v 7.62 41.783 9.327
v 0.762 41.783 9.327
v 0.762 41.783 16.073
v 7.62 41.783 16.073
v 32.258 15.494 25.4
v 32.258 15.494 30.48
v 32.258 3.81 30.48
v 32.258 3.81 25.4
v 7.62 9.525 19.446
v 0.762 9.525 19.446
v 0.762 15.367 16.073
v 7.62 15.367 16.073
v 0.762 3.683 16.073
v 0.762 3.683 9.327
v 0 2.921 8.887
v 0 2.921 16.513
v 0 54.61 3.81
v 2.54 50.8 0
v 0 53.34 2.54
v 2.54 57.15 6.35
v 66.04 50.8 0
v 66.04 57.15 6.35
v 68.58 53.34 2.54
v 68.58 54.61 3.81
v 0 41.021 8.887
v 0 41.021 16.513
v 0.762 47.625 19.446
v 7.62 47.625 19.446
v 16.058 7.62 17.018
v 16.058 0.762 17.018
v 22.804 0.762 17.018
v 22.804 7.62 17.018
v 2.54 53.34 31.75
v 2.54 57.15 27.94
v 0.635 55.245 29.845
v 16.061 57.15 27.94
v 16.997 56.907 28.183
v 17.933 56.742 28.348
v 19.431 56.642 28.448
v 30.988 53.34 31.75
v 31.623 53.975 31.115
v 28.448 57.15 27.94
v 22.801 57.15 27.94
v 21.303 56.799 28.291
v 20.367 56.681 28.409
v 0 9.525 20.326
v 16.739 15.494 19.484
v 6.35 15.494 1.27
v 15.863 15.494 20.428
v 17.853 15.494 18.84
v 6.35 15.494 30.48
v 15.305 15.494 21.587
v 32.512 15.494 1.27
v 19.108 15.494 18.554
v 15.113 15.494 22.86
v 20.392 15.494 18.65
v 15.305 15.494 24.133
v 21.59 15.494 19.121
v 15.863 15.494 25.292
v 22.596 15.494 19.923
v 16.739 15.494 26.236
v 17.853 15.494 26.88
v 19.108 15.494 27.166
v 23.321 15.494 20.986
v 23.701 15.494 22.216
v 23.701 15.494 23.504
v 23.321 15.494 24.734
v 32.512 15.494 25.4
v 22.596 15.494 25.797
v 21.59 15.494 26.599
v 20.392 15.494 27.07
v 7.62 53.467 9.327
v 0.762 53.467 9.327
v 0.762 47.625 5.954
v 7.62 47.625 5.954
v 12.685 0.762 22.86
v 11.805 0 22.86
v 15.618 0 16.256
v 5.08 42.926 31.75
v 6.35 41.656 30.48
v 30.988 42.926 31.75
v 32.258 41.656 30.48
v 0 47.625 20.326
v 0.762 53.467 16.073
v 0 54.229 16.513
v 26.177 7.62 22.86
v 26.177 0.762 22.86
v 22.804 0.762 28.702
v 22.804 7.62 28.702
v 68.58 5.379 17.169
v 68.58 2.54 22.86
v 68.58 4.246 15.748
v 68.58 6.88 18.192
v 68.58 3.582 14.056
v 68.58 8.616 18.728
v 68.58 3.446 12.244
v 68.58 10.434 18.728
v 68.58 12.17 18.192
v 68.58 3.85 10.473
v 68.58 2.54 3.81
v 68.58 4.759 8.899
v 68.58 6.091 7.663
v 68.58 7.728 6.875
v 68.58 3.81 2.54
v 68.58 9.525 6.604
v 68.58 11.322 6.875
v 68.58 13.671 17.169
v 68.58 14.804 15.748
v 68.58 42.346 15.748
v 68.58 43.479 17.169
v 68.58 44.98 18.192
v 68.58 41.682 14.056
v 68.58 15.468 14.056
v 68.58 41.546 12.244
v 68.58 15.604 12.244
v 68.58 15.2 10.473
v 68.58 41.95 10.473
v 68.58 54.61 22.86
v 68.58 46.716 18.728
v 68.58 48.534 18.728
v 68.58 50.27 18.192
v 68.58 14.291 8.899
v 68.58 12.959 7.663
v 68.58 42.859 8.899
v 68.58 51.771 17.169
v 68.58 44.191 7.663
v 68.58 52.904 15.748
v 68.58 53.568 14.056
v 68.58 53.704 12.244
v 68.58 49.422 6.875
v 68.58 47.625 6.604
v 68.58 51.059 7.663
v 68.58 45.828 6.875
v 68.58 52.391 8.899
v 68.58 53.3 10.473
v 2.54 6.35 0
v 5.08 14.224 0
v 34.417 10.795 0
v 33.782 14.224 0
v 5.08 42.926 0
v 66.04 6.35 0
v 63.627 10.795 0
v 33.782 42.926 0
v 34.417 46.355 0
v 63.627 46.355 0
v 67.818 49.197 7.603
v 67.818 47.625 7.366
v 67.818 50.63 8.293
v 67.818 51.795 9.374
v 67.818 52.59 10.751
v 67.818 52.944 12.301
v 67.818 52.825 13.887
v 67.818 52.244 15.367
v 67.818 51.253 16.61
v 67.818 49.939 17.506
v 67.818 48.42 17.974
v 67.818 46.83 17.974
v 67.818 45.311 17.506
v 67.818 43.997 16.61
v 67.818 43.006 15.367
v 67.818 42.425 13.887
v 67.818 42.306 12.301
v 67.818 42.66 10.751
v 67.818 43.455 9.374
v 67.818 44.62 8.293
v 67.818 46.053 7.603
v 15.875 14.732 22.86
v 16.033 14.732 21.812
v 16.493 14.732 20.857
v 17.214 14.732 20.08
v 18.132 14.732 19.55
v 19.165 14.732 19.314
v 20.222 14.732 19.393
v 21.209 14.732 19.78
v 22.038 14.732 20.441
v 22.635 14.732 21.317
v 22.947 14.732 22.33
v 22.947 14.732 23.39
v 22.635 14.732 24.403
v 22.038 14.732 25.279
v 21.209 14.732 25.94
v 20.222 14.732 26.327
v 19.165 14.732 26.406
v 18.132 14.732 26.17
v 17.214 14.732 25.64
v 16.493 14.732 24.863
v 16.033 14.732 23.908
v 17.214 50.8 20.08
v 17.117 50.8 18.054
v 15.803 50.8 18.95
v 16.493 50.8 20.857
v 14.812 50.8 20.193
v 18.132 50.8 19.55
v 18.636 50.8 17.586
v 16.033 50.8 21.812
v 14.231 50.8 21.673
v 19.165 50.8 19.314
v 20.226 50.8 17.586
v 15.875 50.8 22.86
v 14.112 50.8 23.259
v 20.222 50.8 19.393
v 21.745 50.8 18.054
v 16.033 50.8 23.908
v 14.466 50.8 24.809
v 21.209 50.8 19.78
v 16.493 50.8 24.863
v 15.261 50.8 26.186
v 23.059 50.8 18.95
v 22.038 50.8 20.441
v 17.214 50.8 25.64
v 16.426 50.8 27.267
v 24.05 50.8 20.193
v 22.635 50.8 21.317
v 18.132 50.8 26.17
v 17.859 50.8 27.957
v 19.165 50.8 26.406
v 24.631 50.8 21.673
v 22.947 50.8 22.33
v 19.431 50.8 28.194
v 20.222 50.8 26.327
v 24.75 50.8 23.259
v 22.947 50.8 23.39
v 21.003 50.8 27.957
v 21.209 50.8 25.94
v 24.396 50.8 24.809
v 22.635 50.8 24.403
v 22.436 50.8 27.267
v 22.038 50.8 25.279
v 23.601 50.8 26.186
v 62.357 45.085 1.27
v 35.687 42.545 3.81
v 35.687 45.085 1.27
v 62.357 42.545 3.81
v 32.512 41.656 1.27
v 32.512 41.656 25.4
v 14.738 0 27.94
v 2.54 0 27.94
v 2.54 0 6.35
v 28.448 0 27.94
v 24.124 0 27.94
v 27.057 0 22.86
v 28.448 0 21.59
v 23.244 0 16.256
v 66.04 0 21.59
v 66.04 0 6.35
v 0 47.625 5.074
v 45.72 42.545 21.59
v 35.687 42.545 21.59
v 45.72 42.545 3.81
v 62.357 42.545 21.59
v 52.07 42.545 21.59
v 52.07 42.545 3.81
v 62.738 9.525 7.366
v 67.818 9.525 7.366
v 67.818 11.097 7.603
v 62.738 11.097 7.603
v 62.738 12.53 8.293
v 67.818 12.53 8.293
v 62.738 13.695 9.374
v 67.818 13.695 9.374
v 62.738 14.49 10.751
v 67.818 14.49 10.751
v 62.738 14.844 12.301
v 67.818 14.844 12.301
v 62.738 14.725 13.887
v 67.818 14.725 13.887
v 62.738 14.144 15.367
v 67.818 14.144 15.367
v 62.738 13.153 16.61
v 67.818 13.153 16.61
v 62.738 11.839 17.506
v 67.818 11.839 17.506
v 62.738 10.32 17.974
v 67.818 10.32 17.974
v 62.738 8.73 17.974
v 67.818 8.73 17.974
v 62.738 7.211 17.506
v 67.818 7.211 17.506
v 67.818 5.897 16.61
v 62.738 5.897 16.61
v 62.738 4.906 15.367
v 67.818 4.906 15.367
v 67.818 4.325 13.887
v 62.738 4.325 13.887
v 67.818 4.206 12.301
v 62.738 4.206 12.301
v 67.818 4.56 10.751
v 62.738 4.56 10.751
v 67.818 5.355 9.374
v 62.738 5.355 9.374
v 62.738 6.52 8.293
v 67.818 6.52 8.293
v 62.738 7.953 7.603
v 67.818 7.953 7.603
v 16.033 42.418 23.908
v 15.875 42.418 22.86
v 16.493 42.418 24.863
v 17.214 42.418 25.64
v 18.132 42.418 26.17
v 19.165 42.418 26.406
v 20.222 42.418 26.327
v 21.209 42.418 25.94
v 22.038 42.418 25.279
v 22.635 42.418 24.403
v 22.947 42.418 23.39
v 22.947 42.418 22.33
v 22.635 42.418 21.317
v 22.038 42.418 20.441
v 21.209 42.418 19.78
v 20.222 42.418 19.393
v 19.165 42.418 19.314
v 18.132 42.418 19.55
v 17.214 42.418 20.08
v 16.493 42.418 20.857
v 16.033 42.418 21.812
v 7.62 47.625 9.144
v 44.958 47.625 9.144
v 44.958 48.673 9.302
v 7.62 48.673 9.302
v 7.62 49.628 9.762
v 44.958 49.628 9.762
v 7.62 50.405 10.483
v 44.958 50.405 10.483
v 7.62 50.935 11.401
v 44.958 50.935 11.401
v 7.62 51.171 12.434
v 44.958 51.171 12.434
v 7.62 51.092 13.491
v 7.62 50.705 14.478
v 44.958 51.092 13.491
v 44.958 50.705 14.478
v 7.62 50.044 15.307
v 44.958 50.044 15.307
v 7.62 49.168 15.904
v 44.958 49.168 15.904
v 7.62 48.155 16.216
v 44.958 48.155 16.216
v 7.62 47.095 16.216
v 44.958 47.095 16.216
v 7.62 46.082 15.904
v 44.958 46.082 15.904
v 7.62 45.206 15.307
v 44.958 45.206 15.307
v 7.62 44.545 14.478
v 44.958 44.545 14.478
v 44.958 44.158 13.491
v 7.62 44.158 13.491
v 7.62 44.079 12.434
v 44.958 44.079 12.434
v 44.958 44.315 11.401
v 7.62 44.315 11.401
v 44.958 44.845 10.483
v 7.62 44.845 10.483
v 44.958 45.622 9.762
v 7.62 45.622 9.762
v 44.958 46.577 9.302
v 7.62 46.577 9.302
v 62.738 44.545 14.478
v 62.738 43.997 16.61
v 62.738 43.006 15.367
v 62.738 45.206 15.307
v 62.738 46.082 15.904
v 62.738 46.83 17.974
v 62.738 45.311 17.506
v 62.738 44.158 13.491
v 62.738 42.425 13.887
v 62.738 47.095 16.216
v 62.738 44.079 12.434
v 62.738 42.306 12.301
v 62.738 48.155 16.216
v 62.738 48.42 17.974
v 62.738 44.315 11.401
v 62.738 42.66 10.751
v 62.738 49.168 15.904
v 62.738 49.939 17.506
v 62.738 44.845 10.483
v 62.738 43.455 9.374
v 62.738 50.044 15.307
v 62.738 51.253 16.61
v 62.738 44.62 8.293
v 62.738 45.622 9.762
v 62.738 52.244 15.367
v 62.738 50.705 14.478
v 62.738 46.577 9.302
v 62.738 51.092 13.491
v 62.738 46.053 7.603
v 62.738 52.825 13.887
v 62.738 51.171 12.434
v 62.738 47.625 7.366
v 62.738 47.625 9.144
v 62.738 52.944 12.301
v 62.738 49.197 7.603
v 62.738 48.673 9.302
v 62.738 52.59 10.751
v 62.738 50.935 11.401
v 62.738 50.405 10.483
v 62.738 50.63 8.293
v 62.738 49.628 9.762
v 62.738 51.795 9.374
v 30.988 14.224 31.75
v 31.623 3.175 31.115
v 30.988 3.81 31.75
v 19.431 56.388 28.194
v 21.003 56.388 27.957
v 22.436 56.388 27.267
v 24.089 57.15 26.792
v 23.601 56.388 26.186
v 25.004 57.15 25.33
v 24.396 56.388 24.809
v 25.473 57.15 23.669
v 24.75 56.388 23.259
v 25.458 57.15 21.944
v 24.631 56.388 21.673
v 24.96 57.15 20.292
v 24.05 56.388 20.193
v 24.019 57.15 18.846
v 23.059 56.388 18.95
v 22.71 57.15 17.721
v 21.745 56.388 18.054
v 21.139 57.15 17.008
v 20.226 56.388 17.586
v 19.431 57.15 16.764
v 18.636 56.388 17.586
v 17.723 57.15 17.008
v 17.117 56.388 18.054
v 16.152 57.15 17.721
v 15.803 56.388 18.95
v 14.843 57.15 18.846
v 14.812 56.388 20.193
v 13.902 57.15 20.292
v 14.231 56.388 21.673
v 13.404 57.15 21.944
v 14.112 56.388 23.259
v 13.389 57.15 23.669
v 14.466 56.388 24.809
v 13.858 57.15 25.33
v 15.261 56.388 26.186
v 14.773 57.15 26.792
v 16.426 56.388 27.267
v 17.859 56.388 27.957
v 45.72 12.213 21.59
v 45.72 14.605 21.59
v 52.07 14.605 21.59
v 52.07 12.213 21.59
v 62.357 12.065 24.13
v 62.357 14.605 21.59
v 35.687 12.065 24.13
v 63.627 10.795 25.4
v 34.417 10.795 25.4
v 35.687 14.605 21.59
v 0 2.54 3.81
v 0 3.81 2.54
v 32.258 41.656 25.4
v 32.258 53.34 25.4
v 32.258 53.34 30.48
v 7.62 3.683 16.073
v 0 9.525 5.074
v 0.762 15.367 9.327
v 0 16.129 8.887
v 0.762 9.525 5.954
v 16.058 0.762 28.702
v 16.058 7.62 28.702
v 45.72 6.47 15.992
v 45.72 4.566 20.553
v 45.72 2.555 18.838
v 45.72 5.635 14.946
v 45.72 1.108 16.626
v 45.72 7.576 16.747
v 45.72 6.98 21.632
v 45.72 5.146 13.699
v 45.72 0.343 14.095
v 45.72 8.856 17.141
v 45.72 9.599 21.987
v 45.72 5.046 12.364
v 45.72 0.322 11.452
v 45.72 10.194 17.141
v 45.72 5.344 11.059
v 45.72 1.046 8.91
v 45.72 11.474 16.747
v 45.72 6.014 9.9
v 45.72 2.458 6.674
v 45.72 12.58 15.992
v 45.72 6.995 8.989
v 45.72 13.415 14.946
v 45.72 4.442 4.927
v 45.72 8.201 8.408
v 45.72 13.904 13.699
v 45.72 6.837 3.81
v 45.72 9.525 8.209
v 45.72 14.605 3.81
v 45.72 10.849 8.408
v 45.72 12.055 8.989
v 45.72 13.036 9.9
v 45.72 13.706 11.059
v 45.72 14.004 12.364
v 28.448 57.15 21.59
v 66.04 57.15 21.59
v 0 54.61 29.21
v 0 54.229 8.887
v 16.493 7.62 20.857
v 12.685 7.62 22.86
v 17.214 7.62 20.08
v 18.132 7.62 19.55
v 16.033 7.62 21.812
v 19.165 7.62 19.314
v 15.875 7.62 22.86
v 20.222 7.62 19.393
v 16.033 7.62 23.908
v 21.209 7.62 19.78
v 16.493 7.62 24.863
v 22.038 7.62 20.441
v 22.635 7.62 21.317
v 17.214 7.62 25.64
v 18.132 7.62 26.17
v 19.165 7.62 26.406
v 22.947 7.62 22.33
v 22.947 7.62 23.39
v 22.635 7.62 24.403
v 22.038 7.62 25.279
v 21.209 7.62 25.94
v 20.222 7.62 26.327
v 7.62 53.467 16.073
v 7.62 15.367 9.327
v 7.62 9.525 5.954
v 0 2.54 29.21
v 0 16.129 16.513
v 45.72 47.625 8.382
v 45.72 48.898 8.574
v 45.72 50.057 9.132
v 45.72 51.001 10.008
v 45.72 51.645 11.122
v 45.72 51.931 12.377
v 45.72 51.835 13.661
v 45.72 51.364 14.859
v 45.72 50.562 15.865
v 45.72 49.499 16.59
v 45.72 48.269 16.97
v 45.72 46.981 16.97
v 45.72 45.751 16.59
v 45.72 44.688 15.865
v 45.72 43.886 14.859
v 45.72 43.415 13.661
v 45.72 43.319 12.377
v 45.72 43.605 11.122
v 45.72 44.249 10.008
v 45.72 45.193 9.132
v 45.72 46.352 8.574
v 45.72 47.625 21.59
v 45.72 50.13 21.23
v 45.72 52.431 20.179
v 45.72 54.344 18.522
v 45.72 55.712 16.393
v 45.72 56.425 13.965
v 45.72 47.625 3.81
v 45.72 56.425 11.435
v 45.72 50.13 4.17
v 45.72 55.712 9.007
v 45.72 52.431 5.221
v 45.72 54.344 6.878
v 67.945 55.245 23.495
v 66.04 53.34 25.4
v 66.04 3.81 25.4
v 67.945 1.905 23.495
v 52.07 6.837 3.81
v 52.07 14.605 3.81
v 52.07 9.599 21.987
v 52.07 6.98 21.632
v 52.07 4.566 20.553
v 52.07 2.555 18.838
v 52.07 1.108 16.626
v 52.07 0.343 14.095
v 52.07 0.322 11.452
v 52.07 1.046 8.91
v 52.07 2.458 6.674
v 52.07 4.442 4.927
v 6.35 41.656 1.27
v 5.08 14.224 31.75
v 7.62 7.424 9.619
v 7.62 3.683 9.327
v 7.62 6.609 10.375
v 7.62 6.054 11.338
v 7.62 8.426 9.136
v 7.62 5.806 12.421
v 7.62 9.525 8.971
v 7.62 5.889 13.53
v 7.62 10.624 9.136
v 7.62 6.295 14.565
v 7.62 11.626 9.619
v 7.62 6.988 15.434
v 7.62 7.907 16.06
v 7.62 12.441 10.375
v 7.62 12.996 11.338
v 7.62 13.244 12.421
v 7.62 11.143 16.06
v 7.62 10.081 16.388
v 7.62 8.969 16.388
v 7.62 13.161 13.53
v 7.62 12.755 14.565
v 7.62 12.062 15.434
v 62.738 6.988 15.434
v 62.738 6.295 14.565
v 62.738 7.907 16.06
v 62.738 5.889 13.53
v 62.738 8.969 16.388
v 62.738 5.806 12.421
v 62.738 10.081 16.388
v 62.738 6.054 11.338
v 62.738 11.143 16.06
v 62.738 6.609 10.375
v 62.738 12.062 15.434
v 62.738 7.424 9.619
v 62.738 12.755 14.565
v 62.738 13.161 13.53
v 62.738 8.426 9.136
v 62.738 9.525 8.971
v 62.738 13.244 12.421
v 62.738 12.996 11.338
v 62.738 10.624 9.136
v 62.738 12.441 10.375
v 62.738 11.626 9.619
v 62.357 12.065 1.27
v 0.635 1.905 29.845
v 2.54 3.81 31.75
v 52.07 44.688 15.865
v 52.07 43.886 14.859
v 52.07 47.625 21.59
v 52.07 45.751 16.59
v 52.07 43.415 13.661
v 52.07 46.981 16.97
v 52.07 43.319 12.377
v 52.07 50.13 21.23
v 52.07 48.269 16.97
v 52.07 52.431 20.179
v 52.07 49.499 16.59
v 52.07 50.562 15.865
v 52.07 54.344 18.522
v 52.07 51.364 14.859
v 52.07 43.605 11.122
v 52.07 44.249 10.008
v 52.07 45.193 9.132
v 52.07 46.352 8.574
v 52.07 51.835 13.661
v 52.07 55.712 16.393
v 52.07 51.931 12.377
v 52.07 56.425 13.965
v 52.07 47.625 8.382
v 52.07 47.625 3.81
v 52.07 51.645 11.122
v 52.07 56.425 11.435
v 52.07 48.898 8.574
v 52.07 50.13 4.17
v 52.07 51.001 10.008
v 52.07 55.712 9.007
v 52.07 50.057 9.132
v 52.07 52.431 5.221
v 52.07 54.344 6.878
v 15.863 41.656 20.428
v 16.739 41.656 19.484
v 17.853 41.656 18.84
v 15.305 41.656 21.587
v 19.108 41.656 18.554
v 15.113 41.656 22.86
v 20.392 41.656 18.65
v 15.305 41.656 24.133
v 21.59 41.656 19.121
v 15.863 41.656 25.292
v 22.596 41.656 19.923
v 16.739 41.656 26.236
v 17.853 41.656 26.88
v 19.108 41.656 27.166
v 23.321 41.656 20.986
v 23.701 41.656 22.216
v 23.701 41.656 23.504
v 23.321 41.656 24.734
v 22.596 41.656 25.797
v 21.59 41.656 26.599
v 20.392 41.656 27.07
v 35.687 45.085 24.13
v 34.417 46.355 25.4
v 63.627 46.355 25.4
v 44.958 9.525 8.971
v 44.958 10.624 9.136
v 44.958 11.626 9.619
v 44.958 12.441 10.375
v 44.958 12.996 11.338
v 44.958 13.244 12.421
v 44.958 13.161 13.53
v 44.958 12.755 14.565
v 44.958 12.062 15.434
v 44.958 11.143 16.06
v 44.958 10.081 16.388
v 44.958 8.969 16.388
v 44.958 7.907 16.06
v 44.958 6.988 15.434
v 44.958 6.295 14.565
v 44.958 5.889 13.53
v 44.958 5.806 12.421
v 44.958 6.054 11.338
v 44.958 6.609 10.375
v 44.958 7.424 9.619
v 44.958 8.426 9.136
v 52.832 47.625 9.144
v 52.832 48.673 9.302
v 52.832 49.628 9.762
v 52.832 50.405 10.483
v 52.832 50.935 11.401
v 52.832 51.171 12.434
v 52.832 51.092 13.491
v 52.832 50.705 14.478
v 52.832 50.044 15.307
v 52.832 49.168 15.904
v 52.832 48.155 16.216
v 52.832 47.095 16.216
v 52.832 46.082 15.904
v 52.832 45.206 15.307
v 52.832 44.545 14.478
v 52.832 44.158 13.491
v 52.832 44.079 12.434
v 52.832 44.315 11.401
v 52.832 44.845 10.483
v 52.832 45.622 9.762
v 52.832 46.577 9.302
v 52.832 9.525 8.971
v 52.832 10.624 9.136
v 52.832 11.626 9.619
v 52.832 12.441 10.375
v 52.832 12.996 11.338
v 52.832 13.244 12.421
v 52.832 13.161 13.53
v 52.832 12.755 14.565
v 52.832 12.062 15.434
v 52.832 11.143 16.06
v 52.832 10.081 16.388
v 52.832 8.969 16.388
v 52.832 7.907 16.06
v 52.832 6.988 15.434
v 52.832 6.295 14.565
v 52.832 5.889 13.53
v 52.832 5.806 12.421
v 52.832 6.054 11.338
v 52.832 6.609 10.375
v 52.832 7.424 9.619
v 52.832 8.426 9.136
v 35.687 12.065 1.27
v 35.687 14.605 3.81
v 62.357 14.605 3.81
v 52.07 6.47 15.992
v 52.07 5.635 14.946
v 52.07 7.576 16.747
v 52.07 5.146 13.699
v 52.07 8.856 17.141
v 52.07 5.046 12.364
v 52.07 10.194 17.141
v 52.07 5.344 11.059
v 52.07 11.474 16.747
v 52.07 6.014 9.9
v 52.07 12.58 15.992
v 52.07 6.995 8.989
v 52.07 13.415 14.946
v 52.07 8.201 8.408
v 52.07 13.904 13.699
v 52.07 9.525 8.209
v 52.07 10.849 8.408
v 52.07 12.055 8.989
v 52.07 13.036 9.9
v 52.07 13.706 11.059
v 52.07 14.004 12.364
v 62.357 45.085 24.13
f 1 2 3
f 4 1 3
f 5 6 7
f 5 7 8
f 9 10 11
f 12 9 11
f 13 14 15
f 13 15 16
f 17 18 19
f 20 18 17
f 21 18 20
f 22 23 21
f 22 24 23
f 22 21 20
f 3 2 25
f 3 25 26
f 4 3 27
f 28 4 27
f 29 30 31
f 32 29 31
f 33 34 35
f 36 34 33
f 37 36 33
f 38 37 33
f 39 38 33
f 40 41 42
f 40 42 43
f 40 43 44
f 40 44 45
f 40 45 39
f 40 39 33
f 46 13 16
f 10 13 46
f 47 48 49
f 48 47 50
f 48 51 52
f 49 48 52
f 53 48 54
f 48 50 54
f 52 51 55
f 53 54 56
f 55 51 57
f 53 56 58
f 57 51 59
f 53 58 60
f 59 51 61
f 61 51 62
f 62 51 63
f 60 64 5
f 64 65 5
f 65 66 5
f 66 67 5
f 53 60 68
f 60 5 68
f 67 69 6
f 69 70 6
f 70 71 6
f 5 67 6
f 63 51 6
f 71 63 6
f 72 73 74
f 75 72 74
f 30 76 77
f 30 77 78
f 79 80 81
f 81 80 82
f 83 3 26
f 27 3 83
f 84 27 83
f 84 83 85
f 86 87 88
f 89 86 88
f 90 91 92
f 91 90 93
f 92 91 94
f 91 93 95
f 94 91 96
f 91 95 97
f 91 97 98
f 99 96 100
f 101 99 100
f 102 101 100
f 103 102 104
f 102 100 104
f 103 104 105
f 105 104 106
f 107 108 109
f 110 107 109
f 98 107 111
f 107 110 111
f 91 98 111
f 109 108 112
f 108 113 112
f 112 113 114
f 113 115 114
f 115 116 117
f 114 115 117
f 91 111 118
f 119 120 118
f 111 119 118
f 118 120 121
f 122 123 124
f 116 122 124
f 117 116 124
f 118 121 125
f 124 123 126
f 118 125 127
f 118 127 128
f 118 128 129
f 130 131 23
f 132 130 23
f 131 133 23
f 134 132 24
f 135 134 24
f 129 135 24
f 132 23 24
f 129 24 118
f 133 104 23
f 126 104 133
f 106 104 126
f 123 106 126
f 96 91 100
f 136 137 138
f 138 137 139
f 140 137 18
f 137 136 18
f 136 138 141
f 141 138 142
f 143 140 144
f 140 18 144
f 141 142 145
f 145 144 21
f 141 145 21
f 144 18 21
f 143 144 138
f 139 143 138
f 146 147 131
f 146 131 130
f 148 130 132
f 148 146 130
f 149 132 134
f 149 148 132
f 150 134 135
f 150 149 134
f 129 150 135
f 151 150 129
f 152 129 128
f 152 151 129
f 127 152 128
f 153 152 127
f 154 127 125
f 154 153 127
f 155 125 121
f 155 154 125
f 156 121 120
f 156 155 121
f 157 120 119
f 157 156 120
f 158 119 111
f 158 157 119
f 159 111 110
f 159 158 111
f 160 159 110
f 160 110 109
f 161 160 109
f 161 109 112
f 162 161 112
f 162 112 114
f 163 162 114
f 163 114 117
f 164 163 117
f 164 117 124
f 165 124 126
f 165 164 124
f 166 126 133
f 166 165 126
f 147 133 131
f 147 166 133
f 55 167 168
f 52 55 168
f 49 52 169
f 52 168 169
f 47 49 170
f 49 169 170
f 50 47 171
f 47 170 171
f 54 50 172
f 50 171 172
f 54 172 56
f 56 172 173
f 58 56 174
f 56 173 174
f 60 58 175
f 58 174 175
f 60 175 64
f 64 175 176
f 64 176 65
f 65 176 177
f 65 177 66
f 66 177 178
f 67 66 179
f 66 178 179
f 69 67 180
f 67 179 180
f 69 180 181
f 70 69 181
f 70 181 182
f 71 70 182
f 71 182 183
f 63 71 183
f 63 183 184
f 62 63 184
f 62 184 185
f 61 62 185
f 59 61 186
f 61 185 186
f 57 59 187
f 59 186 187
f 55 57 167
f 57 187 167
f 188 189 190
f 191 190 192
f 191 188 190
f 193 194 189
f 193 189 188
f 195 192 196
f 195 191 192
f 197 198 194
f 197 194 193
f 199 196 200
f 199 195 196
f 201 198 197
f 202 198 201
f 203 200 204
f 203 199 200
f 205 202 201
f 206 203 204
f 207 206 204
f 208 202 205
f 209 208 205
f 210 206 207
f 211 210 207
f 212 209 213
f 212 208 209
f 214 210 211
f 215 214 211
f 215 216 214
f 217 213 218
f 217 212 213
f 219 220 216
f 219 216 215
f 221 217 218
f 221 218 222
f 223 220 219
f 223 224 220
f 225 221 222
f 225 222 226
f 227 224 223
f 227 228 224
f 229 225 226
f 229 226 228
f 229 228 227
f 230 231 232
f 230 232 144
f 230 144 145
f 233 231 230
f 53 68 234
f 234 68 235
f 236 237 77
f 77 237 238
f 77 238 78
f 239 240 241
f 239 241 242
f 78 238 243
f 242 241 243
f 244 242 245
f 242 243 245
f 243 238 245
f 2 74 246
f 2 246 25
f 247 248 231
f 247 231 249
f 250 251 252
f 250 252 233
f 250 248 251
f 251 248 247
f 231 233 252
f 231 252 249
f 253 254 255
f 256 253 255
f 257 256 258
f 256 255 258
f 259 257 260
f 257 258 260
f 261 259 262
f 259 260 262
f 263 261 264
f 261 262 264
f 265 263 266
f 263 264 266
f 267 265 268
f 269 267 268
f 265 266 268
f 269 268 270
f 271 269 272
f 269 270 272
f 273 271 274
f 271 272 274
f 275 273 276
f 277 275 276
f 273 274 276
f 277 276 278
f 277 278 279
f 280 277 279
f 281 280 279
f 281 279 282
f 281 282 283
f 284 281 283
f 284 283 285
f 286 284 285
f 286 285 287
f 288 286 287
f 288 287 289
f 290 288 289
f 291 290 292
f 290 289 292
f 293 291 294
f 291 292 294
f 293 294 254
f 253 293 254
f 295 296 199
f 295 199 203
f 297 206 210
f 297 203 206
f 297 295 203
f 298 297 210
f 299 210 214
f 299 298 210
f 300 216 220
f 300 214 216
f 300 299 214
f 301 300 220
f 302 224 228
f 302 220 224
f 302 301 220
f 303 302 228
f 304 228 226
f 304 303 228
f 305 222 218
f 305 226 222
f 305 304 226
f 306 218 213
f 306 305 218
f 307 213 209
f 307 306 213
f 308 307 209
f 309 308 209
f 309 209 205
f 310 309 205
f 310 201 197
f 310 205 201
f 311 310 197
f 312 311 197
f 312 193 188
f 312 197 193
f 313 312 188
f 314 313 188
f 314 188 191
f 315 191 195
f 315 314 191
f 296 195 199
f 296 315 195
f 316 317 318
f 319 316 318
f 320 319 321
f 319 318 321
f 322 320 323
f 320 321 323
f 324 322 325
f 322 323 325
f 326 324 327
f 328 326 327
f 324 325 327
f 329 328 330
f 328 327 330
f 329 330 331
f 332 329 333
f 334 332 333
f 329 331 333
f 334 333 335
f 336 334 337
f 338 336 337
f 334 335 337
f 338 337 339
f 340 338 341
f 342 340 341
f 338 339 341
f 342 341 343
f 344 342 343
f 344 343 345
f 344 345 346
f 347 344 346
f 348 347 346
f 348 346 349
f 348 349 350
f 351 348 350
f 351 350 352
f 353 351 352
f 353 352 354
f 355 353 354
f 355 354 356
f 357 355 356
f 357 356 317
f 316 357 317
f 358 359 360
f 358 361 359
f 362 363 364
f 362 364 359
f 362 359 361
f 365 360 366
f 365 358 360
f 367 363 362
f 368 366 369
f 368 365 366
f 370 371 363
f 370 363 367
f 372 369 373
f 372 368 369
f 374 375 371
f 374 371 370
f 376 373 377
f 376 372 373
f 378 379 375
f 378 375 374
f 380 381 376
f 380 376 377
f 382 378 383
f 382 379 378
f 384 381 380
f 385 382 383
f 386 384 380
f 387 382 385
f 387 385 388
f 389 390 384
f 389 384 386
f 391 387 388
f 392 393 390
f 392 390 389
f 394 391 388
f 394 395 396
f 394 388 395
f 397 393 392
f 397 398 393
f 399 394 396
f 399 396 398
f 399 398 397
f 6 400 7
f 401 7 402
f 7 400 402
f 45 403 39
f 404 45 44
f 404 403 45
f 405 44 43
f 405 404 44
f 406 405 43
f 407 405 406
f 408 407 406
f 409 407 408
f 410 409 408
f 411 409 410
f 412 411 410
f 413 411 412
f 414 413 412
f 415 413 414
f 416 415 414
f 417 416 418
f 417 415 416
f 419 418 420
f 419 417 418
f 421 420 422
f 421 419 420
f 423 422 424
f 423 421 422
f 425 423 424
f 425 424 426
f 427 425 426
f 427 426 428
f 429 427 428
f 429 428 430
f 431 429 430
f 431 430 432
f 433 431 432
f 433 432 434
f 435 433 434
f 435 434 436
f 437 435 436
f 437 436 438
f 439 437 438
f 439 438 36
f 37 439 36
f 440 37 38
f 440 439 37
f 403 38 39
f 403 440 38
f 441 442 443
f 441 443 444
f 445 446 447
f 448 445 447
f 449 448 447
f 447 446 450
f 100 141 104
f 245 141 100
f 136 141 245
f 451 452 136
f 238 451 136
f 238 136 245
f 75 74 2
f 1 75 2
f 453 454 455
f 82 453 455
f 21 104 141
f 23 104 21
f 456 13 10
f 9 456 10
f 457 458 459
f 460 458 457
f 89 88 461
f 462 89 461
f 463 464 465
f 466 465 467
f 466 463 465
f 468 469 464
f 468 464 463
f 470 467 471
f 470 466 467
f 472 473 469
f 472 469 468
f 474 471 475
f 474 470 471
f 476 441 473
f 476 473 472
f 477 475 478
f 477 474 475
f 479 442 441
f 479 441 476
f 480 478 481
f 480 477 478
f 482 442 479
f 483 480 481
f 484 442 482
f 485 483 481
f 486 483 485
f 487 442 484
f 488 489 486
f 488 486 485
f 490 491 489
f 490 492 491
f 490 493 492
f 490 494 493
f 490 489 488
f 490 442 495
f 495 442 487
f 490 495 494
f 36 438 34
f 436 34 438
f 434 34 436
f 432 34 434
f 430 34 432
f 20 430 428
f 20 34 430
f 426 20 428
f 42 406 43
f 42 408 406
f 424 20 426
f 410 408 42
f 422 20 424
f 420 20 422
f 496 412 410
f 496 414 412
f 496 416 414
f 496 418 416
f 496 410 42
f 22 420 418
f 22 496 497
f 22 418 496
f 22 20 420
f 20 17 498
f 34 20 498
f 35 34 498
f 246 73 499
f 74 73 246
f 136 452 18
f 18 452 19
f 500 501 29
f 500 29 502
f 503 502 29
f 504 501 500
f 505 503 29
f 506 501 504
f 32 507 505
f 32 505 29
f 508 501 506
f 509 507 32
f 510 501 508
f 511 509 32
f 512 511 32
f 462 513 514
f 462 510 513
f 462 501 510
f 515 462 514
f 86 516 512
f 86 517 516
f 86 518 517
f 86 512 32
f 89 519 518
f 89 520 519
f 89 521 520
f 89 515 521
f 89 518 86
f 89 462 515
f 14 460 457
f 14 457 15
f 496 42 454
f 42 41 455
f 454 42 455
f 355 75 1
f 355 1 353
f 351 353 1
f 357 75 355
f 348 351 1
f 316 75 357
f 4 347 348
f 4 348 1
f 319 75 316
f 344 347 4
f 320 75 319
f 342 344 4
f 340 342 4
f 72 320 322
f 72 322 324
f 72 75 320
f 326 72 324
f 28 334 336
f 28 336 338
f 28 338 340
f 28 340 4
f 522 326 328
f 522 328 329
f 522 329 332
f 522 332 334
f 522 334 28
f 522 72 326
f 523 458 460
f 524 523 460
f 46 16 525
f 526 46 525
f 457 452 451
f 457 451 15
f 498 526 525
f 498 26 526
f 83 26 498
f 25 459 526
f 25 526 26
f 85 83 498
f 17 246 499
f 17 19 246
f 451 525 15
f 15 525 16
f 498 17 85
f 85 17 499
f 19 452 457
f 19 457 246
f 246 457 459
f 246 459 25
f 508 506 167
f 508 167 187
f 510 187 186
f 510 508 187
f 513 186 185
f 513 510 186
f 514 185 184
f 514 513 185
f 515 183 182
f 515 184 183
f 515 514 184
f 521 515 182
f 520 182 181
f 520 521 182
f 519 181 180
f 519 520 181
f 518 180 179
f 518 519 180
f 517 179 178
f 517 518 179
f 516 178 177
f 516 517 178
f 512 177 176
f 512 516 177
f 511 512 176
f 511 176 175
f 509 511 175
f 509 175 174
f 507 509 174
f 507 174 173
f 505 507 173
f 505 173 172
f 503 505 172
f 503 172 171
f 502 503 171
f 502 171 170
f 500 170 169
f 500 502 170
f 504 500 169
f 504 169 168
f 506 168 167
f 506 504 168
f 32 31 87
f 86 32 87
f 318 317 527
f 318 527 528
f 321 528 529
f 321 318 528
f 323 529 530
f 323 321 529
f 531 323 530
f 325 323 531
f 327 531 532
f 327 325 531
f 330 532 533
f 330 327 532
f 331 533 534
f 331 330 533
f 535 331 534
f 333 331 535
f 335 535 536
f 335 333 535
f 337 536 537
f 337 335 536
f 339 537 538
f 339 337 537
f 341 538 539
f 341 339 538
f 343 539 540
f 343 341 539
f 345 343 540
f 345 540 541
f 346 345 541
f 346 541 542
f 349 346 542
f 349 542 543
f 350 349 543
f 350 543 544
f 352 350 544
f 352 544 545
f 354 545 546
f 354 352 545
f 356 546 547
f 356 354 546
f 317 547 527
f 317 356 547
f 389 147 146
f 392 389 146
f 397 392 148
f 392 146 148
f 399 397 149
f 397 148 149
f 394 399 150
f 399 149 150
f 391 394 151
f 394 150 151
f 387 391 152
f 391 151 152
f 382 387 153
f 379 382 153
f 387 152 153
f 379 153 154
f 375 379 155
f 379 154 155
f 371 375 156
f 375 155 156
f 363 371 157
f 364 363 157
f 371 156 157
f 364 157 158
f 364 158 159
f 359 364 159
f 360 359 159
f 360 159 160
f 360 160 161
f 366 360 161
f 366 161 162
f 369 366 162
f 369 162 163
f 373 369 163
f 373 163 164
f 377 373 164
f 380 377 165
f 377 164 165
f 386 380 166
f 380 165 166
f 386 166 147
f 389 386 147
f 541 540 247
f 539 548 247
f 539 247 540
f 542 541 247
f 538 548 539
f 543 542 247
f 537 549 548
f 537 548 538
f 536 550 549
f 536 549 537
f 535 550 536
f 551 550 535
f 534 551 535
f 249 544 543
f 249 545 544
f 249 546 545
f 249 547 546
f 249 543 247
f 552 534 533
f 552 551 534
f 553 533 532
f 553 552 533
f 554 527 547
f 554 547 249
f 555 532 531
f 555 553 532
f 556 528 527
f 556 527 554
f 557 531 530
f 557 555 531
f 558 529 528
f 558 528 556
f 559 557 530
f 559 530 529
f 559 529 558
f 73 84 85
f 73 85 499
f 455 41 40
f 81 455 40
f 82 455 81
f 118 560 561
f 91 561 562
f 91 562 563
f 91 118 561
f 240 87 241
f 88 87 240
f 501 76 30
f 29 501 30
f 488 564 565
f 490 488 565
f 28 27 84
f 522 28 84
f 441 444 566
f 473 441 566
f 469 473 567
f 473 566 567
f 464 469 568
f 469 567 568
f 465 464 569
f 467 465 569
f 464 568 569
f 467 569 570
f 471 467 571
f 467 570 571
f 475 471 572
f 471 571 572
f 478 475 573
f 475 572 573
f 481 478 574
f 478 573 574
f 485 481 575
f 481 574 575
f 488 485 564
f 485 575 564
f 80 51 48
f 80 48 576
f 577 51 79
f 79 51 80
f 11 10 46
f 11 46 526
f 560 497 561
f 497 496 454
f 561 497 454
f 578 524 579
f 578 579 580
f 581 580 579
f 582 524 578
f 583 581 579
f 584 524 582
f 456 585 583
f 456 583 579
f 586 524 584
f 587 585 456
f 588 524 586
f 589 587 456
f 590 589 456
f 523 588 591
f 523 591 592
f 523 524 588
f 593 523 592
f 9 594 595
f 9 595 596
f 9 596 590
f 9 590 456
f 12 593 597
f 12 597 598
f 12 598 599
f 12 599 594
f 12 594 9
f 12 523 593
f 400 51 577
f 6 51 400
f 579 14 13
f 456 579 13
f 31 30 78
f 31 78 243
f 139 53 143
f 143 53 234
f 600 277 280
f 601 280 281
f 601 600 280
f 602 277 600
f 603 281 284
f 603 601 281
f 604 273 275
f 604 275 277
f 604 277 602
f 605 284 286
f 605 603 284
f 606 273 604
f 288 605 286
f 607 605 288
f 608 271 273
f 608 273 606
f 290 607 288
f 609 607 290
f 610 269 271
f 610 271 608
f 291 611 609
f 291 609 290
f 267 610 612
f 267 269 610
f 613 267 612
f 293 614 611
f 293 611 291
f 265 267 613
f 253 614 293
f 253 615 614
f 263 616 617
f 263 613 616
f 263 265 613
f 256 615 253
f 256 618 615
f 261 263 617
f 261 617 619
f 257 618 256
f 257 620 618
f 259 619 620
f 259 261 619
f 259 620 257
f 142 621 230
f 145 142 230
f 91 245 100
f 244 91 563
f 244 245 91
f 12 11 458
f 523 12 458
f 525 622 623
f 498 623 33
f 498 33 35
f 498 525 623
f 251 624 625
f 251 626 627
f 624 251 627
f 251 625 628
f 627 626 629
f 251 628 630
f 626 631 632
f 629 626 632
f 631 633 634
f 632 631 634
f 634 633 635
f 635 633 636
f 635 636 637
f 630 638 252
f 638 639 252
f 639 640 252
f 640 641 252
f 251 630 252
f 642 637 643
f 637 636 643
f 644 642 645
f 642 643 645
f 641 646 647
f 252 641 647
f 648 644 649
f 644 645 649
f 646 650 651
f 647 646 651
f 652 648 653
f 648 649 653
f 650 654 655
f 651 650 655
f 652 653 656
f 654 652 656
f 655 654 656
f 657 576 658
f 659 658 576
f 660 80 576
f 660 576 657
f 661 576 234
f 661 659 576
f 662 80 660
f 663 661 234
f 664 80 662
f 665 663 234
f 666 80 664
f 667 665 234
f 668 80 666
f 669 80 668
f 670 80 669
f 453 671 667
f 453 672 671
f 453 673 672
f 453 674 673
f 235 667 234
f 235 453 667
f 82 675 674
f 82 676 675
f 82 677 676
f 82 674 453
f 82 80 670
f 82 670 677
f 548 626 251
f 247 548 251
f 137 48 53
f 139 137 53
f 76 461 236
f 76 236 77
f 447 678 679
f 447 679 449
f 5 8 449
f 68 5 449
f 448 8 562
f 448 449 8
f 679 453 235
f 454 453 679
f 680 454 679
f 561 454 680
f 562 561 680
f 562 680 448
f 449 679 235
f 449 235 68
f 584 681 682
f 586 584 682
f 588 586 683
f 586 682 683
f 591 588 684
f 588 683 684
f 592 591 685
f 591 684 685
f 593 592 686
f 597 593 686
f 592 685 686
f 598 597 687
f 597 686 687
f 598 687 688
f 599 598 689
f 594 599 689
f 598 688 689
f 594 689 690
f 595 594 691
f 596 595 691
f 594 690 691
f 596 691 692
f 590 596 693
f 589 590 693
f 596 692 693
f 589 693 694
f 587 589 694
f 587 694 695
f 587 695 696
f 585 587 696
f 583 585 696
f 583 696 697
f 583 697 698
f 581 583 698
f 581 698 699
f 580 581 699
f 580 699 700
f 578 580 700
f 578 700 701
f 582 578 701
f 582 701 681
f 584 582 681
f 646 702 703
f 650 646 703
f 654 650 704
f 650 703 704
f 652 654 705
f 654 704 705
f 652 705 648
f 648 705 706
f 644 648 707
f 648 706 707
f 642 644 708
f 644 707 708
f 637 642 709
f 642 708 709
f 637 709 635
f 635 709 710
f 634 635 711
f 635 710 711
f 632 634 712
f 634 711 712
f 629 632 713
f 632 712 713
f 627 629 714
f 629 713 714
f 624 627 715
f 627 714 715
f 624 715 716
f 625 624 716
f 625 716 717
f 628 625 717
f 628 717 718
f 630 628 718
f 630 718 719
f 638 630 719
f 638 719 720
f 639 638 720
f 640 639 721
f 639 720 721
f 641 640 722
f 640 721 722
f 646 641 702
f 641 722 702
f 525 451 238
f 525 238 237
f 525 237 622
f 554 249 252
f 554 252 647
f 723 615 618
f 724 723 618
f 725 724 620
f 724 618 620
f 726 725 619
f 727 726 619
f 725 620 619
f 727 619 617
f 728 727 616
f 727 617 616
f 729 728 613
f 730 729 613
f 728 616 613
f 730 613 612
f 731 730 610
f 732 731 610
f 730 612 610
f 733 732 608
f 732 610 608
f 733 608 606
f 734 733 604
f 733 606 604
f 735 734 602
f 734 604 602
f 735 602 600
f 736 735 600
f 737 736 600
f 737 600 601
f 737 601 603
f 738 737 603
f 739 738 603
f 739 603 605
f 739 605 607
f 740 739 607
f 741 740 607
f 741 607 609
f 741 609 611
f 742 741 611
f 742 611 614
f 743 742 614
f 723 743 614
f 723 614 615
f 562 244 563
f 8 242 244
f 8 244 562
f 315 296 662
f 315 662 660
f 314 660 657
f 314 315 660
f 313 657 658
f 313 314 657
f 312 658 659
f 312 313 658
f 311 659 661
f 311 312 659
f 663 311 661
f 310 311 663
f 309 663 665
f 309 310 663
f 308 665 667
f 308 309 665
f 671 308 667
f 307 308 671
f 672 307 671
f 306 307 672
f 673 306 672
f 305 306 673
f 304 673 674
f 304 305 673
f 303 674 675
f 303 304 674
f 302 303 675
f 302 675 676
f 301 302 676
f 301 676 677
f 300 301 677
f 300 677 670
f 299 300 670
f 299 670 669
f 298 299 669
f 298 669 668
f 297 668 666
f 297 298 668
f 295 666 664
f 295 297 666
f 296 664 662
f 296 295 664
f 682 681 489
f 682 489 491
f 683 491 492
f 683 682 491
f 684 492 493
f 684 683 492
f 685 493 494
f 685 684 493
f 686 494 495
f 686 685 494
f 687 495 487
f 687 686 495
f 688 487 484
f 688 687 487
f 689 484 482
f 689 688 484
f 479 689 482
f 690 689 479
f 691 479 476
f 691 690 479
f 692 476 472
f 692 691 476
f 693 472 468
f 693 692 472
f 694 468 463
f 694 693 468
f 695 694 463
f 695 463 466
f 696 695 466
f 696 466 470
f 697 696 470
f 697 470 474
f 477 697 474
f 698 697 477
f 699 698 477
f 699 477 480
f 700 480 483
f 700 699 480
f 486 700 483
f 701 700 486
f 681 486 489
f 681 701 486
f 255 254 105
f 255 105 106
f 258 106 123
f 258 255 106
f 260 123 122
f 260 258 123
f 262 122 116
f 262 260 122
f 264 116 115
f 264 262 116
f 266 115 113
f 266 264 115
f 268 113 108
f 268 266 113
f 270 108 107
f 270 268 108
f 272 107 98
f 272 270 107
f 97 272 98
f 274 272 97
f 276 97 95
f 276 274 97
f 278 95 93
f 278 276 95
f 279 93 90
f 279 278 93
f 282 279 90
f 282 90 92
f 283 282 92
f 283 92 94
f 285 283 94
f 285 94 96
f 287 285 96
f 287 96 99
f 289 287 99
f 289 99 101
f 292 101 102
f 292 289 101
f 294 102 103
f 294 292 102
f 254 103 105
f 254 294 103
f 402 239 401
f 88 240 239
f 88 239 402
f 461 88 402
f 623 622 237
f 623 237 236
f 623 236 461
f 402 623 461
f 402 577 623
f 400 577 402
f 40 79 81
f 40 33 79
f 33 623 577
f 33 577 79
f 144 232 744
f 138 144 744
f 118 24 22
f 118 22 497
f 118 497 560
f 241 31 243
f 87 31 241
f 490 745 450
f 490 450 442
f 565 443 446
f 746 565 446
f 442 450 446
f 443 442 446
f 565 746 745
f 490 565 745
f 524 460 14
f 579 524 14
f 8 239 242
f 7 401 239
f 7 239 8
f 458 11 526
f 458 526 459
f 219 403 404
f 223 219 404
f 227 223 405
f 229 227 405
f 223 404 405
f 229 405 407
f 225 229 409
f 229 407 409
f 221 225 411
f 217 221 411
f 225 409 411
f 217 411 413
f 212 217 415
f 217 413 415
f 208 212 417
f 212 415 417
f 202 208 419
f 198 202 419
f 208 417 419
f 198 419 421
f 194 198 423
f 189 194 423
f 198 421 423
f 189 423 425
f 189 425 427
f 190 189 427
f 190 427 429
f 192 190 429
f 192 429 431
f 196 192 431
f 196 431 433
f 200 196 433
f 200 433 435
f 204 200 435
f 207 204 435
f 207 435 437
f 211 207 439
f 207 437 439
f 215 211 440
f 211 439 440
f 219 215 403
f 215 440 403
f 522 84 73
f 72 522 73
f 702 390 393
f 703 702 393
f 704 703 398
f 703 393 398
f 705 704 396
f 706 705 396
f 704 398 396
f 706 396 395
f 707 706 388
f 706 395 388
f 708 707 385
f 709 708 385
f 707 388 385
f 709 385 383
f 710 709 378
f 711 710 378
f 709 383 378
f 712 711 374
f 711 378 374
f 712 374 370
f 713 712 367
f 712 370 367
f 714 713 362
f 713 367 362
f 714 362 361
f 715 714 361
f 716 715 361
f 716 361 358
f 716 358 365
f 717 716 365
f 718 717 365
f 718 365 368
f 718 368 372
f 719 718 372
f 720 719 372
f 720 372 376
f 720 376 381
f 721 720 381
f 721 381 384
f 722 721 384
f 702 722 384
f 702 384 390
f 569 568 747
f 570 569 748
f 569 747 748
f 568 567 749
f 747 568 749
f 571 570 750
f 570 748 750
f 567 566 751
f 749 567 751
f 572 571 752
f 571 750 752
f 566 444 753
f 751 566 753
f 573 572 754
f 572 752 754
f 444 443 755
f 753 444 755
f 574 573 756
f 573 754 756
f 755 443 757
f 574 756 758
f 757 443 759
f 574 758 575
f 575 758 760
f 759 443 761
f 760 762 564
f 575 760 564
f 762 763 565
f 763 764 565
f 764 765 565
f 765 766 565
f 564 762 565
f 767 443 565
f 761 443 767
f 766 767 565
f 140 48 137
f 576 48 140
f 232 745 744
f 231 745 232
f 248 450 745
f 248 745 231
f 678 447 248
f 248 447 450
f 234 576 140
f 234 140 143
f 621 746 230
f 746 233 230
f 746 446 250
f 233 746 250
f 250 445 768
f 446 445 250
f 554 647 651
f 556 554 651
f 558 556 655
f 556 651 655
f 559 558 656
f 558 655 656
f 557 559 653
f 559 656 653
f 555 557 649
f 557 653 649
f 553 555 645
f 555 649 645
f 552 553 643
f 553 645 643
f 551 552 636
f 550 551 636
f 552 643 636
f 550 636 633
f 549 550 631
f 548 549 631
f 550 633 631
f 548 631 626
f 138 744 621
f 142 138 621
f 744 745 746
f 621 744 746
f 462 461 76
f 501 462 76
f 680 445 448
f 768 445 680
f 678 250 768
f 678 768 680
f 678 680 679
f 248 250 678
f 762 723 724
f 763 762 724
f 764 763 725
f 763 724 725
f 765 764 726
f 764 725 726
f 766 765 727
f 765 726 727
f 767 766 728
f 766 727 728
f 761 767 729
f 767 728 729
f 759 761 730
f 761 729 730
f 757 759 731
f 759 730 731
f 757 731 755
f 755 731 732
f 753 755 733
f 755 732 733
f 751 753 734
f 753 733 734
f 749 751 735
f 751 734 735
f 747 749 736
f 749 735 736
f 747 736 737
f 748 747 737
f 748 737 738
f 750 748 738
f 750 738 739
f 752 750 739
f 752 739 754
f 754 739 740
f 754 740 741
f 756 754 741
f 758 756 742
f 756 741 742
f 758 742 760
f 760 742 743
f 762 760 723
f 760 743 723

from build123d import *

# Parameters (mm, degrees)
SKETCH1_W               = 68.58
SKETCH1_H               = 57.15
BOSS_EXTRUDE1_DEPTH     = 31.75
SKETCH2_W               = 26.162
SKETCH2_H               = 26.162
SKETCH2_W_2             = 26.67
SKETCH2_H_2             = 27.94
CUT_EXTRUDE1_DEPTH      = 95.749149864
SKETCH5_R               = 3.556
SKETCH5_R_2             = 3.729278609
CUT_EXTRUDE2_DEPTH      = 95.749149864
CUT_EXTRUDE3_START      = -16.51
CUT_EXTRUDE3_DEPTH      = 6.35
SKETCH7_R               = 5.334
CUT_EXTRUDE4_DEPTH      = 5.842
CUT_EXTRUDE5_DEPTH      = 7.62
SKETCH10_W              = 36.322
SKETCH10_H              = 6.35
CUT_EXTRUDE6_DEPTH      = 95.749149864
CUT_EXTRUDE7_DEPTH      = 87.293112332
CUT_EXTRUDE7_DEPTH_BACK = 87.293112332
SKETCH12_R              = 3.556
SKETCH13_R              = 5.334
CUT_EXTRUDE8_DEPTH      = 6.35
CUT_EXTRUDE9_DEPTH      = 7.62
CHAMFER1_SIZE           = 0.762
CHAMFER3_SIZE           = 3.81
CHAMFER5_SIZE           = 1.27
CHAMFER6_SIZE           = 2.54
CHAMFER9_SIZE           = 3.81
CHAMFER10_SIZE          = 6.35


# Some blends are built 0.0001 mm under size
with BuildPart() as part:
    # Sketch1 → Boss-Extrude1 (new body)
    with BuildSketch(Plane.XY):
        with Locations((34.29, 28.575)):
            Rectangle(SKETCH1_W, SKETCH1_H)
    extrude(amount=BOSS_EXTRUDE1_DEPTH)

    # Sketch2 → Cut-Extrude1 (cut, through all)
    with BuildSketch(Plane.XY.offset(31.75)):
        with Locations((19.431, 28.575)):
            Rectangle(SKETCH2_W, SKETCH2_H)
        with Locations((49.022, 28.575)):
            Rectangle(SKETCH2_W_2, SKETCH2_H_2)
    extrude(amount=-CUT_EXTRUDE1_DEPTH, mode=Mode.SUBTRACT)

    # Sketch5 → Cut-Extrude2 (cut, through all)
    with BuildSketch(Plane(origin=(68.58, 0, 0), x_dir=(0, 0, -1), z_dir=(1, 0, 0))):
        with Locations((-12.7, 47.625)):
            Circle(SKETCH5_R)
        with Locations((-12.7, 9.525)):
            Circle(SKETCH5_R_2)
    extrude(amount=-CUT_EXTRUDE2_DEPTH, mode=Mode.SUBTRACT)

    # Sketch6 → Cut-Extrude3 (cut)
    with BuildSketch(Plane(origin=(68.58, 0, 0), x_dir=(0, 0, -1), z_dir=(1, 0, 0)).offset(CUT_EXTRUDE3_START)):
        with BuildLine():
            Line((-21.59, 47.625), (-21.59, 12.21272508))
            ThreePointArc((-21.59, 12.21272508), (-15.38772508, 0.635), (-3.81, 6.83727492))
            Line((-3.81, 6.83727492), (-3.81, 47.625))
            ThreePointArc((-3.81, 47.625), (-12.7, 56.515), (-21.59, 47.625))
        make_face()
    extrude(amount=-CUT_EXTRUDE3_DEPTH, mode=Mode.SUBTRACT)

    # Sketch7 → Cut-Extrude4 (cut)
    with BuildSketch(Plane(origin=(68.58, 0, 0), x_dir=(0, 0, -1), z_dir=(1, 0, 0))):
        with Locations((-12.7, 47.625)):
            Circle(SKETCH7_R)
        with Locations((-12.7, 9.525)):
            Circle(SKETCH7_R)
    extrude(amount=-CUT_EXTRUDE4_DEPTH, mode=Mode.SUBTRACT)

    # Sketch9 → Cut-Extrude5 (cut)
    with BuildSketch(Plane.ZY):
        Polygon((16.072880273, 53.467), (9.327119727, 53.467), (5.954239455, 47.625), (9.327119727, 41.783), (16.072880273, 41.783), (19.445760545, 47.625), align=None)
        Polygon((16.072880273, 15.367), (9.327119727, 15.367), (5.954239455, 9.525), (9.327119727, 3.683), (16.072880273, 3.683), (19.445760545, 9.525), align=None)
    extrude(amount=-CUT_EXTRUDE5_DEPTH, mode=Mode.SUBTRACT)

    # Sketch10 → Cut-Extrude6 (cut, through all)
    with BuildSketch(Plane(origin=(0, 57.15, 0), x_dir=(1, 0, 0), z_dir=(0, 1, 0))):
        with Locations((50.419, -28.575)):
            Rectangle(SKETCH10_W, SKETCH10_H)
    extrude(amount=-CUT_EXTRUDE6_DEPTH, mode=Mode.SUBTRACT)

    # Sketch12 → Cut-Extrude7 (cut, two sides: drawn at the far end of the back side and taken through both)
    with BuildSketch(Plane(origin=(0, 15.494, 0), x_dir=(1, 0, 0), z_dir=(0, 1, 0)).offset(-CUT_EXTRUDE7_DEPTH_BACK)):
        with Locations(Location((19.431, -22.86, 0), (0, 0, 180))):
            Circle(SKETCH12_R)
    extrude(amount=CUT_EXTRUDE7_DEPTH + CUT_EXTRUDE7_DEPTH_BACK, mode=Mode.SUBTRACT)

    # Sketch13 → Cut-Extrude8 (cut)
    with BuildSketch(Plane(origin=(0, 57.15, 0), x_dir=(1, 0, 0), z_dir=(0, 1, 0))):
        with Locations(Location((19.431, -22.86, 0), (0, 0, 270))):
            Circle(SKETCH13_R)
    extrude(amount=-CUT_EXTRUDE8_DEPTH, mode=Mode.SUBTRACT)

    # Sketch14 → Cut-Extrude9 (cut)
    with BuildSketch(Plane.XZ):
        Polygon((22.803880273, 28.702), (16.058119727, 28.702), (12.685239455, 22.86), (16.058119727, 17.018), (22.803880273, 17.018), (26.176760545, 22.86), align=None)
    extrude(amount=-CUT_EXTRUDE9_DEPTH, mode=Mode.SUBTRACT)

    # Chamfer1
    chamfer1_edges = [part.edges().sort_by_distance(p)[0] for p in [
        (0, 50.546, 17.759320409),
        (0, 53.467, 12.7),
        (0, 50.546, 7.640679591),
        (0, 44.704, 7.640679591),
        (0, 41.783, 12.7),
        (0, 44.704, 17.759320409),
        (0, 12.446, 17.759320409),
        (0, 15.367, 12.7),
        (0, 12.446, 7.640679591),
        (0, 6.604, 7.640679591),
        (0, 3.683, 12.7),
        (0, 6.604, 17.759320409),
        (22.987, 41.656, 22.86),
        (22.987, 15.494, 22.86),
        (19.431, 57.15, 17.526),
        (24.490320409, 0, 25.781),
        (19.431, 0, 28.702),
        (14.371679591, 0, 25.781),
        (14.371679591, 0, 19.939),
        (19.431, 0, 17.018),
        (24.490320409, 0, 19.939),
        (45.72, 47.625, 16.256),
        (45.72, 9.525, 16.429278609),
        (52.07, 9.525, 16.429278609),
        (52.07, 47.625, 16.256),
        (68.58, 47.625, 18.034),
        (68.58, 9.525, 18.034),
    ]]
    chamfer(chamfer1_edges, length=CHAMFER1_SIZE)

    # Chamfer3
    chamfer3_edges = [part.edges().sort_by_distance(p)[0] for p in [
        (49.022, 42.545, 25.4),
        (49.022, 14.605, 25.4),
        (49.022, 42.545, 0),
        (49.022, 14.605, 0),
    ]]
    chamfer(chamfer3_edges, length=CHAMFER3_SIZE - 0.0001)  # a hair under: the kernel refuses the full size

    # Chamfer5
    chamfer5_edges = [part.edges().sort_by_distance(p)[0] for p in [
        (19.304, 41.656, 31.75),
        (32.258, 49.403, 31.75),
        (32.258, 7.747, 31.75),
        (35.687, 28.575, 25.4),
        (62.357, 28.575, 25.4),
        (6.35, 28.575, 0),
        (19.431, 41.656, 0),
        (32.512, 28.575, 0),
        (19.431, 15.494, 0),
        (6.35, 28.575, 31.75),
        (19.304, 15.494, 31.75),
        (35.687, 28.575, 0),
        (62.357, 28.575, 0),
    ]]
    chamfer(chamfer5_edges, length=CHAMFER5_SIZE)

    # Chamfer6
    chamfer6_edges = [part.edges().sort_by_distance(p)[0] for p in [
        (68.58, 57.15, 12.7),
        (68.58, 0, 12.7),
        (68.58, 28.575, 25.4),
        (0, 28.575, 31.75),
        (68.58, 28.575, 0),
        (0, 28.575, 0),
        (0, 57.15, 15.875),
        (0, 0, 15.875),
    ]]
    chamfer(chamfer6_edges, length=CHAMFER6_SIZE)

    # Chamfer9
    # the kernel refuses this chamfer: 3.81 mm, written as the material it takes off along each edge
    with BuildSketch(Plane(origin=(32.258, 57.15, 25.4), x_dir=(0, 0.027495876610586386, -0.9996219169112968), z_dir=(1, 0, 0))) as chamfer9_piece_1:
        Polygon((CHAMFER9_SIZE * 0.999621916911, -CHAMFER9_SIZE * 0.0274958766106), (-CHAMFER9_SIZE * 0.0274958766106, -CHAMFER9_SIZE * 0.999621916911), (0, 0), align=None)
    extrude(amount=43.580112184, mode=Mode.SUBTRACT)
    with BuildSketch(Plane(origin=(32.258, 57.15, 40.278112184), x_dir=(-0.9996219169112968, 0.027495876610586414, 0), z_dir=(0, 0, -1))) as chamfer9_piece_2:
        Polygon((CHAMFER9_SIZE * 0.999621916911, -CHAMFER9_SIZE * 0.0274958766106), (-CHAMFER9_SIZE * 0.0274958766106, -CHAMFER9_SIZE * 0.999621916911), (0, 0), align=None)
    extrude(amount=14.878112184, mode=Mode.SUBTRACT)
    with BuildSketch(Plane(origin=(40.786112184, 57.15, 31.75), x_dir=(0, 0.027495876610586386, -0.9996219169112968), z_dir=(-1, 0, 0)), Plane(origin=(-7.258112184, 0, 31.75), x_dir=(0, -0.027495876610586376, -0.9996219169112968), z_dir=(1, 0, 0))) as chamfer9_piece_3:
        Polygon((CHAMFER9_SIZE * 0.999621916911, CHAMFER9_SIZE * 0.0274958766106), (-CHAMFER9_SIZE * 0.0274958766106, CHAMFER9_SIZE * 0.999621916911), (0, 0), align=None)
    extrude(amount=48.044224368, mode=Mode.SUBTRACT)
    with BuildSketch(Plane(origin=(32.258, 0, 40.278112184), x_dir=(-0.9996219169112968, -0.02749587661058639, 0), z_dir=(0, 0, -1))) as chamfer9_piece_4:
        Polygon((CHAMFER9_SIZE * 0.999621916911, CHAMFER9_SIZE * 0.0274958766106), (-CHAMFER9_SIZE * 0.0274958766106, CHAMFER9_SIZE * 0.999621916911), (0, 0), align=None)
    extrude(amount=14.878112184, mode=Mode.SUBTRACT)
    with BuildSketch(Plane(origin=(32.258, 0, 25.4), x_dir=(0, -0.027495876610586403, -0.9996219169112968), z_dir=(1, 0, 0))) as chamfer9_piece_5:
        Polygon((CHAMFER9_SIZE * 0.999621916911, CHAMFER9_SIZE * 0.0274958766106), (-CHAMFER9_SIZE * 0.0274958766106, CHAMFER9_SIZE * 0.999621916911), (0, 0), align=None)
    extrude(amount=43.580112184, mode=Mode.SUBTRACT)
    with BuildSketch(Plane(origin=(32.258, 57.15, 40.278112184), x_dir=(-0.9996219169112968, 0.027495876610586414, 0), z_dir=(0, 0, -1))) as chamfer9_piece_6a_section:
        Polygon((CHAMFER9_SIZE * 0.999621916911, -CHAMFER9_SIZE * 0.0274958766106), (-CHAMFER9_SIZE * 0.0274958766106, -CHAMFER9_SIZE * 0.999621916911), (0, 0), align=None)
    chamfer9_piece_6a = extrude(amount=24.676224368, mode=Mode.PRIVATE)
    chamfer9_piece_6a = split(chamfer9_piece_6a, bisect_by=Plane(origin=(31.001486282, 55.893486282, 25.4), z_dir=(0, 0, -1)), keep=Keep.TOP, mode=Mode.PRIVATE)
    with BuildSketch(Plane(origin=(22.459887816, 57.15, 25.4), x_dir=(0, 0.027495876610586386, -0.9996219169112968), z_dir=(1, 0, 0))) as chamfer9_piece_6b_section:
        Polygon((CHAMFER9_SIZE * 0.999621916911, -CHAMFER9_SIZE * 0.0274958766106), (-CHAMFER9_SIZE * 0.0274958766106, -CHAMFER9_SIZE * 0.999621916911), (0, 0), align=None)
    chamfer9_piece_6b = extrude(amount=53.378224368, mode=Mode.PRIVATE)
    chamfer9_piece_6b = split(chamfer9_piece_6b, bisect_by=Plane(origin=(32.258, 55.893486282, 24.143486282), z_dir=(-1, 0, 0)), keep=Keep.TOP, mode=Mode.PRIVATE)
    chamfer9_piece_6 = chamfer9_piece_6a & chamfer9_piece_6b
    add(chamfer9_piece_6, mode=Mode.SUBTRACT)
    with BuildSketch(Plane(origin=(32.258, 0, 40.278112184), x_dir=(-0.9996219169112968, -0.02749587661058639, 0), z_dir=(0, 0, -1))) as chamfer9_piece_7a_section:
        Polygon((CHAMFER9_SIZE * 0.999621916911, CHAMFER9_SIZE * 0.0274958766106), (-CHAMFER9_SIZE * 0.0274958766106, CHAMFER9_SIZE * 0.999621916911), (0, 0), align=None)
    chamfer9_piece_7a = extrude(amount=24.676224368, mode=Mode.PRIVATE)
    chamfer9_piece_7a = split(chamfer9_piece_7a, bisect_by=Plane(origin=(31.001486282, 1.256513718, 25.4), z_dir=(0, 0, -1)), keep=Keep.TOP, mode=Mode.PRIVATE)
    with BuildSketch(Plane(origin=(22.459887816, 0, 25.4), x_dir=(0, -0.02749587661058639, -0.9996219169112968), z_dir=(1, 0, 0))) as chamfer9_piece_7b_section:
        Polygon((CHAMFER9_SIZE * 0.999621916911, CHAMFER9_SIZE * 0.0274958766106), (-CHAMFER9_SIZE * 0.0274958766106, CHAMFER9_SIZE * 0.999621916911), (0, 0), align=None)
    chamfer9_piece_7b = extrude(amount=53.378224368, mode=Mode.PRIVATE)
    chamfer9_piece_7b = split(chamfer9_piece_7b, bisect_by=Plane(origin=(32.258, 1.256513718, 24.143486282), z_dir=(-1, 0, 0)), keep=Keep.TOP, mode=Mode.PRIVATE)
    chamfer9_piece_7 = chamfer9_piece_7a & chamfer9_piece_7b
    add(chamfer9_piece_7, mode=Mode.SUBTRACT)

    # Chamfer10
    # the kernel refuses this chamfer: 6.35 mm, written as the material it takes off along each edge
    with BuildSketch(Plane(origin=(82.370186974, 57.15, 0), x_dir=(0, -0.9996219169112968, -0.027495876610586355), z_dir=(-1, 0, 0)), Plane(origin=(-13.790186974, 0, 0), x_dir=(0, 0.9996219169112966, -0.02749587661058638), z_dir=(1, 0, 0))) as chamfer10_piece_1:
        Polygon((CHAMFER10_SIZE * 0.999621916911, CHAMFER10_SIZE * 0.0274958766106), (-CHAMFER10_SIZE * 0.0274958766106, CHAMFER10_SIZE * 0.999621916911), (0, 0), align=None)
    extrude(amount=96.160373947, mode=Mode.SUBTRACT)


solid = part.part
